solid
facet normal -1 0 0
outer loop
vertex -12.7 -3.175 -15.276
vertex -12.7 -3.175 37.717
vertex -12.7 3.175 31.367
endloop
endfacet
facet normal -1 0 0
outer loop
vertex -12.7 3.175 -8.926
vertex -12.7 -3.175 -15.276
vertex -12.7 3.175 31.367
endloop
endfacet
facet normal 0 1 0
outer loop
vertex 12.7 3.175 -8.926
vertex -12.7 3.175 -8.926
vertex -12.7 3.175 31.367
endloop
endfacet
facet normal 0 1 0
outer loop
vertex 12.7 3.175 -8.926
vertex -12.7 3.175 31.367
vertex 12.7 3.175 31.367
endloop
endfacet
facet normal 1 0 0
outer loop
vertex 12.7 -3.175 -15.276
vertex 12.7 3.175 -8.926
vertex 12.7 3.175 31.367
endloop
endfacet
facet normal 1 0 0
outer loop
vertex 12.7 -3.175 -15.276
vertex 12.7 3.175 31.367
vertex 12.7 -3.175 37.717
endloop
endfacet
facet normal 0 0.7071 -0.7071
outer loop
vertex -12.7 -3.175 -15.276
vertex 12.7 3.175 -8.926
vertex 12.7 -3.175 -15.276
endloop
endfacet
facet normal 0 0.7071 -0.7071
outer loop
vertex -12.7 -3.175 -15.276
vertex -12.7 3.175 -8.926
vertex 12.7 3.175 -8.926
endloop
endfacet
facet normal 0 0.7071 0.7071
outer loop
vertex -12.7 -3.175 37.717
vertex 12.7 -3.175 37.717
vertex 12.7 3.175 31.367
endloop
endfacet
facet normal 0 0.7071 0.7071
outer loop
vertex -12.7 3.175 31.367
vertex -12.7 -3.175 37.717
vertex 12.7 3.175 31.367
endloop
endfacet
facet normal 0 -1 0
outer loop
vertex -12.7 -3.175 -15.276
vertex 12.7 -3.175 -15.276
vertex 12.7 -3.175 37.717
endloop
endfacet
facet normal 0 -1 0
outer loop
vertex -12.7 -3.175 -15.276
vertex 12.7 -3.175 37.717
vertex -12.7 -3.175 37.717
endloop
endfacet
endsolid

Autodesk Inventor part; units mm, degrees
ref_plane "Start plane" through (0, 0, -15.2763) normal (0, 0, 1) x (1, 0, 0)
ref_plane "End plane" through (0, 0, 37.7171) normal (0, 0, 1) x (1, 0, 0)
sketch "Sketch" plane through (0, 0, 0) normal (0, 0, 1) x (1, 0, 0)
  line L0 (12.7, -3.175) -> (-12.7, -3.175)
  line L1 (-12.7, -3.175) -> (-12.7, 3.175)
  line L2 (-12.7, 3.175) -> (12.7, 3.175)
  line L3 (12.7, 3.175) -> (12.7, -3.175)
  line L4 (-6, 0) -> (8, 0) construction
  line L5 (0, -30) -> (0, 40) construction
  line L6 (0, 54) -> (0, -44) construction
  line L7 (-17.78, 0) -> (17.78, 0) construction
  dimension "d0" = 6.35
  dimension "d1" = 25.4
  dimension "d4" = 12.7
  dimension "d5" = 3.175
extrude "Body" add sketch "Sketch" along normal up to surface (52.9934 mm away) from surface at -15.2763
sketch "Sketch3" plane through (0, 0, 0) normal (0, 0, 1) x (1, 0, 0)
  line L0 (0, 0) -> (10, 0)
ref_plane "Work Plane3" through (0, 0, 0) normal (0, -1, 0) x (1, 0, 0)
sketch "Sketch4" plane through (0, 0, 0) normal (0, -1, 0) x (1, 0, 0)
  line L0 (-2, -15.2763) -> (12, -15.2763)
  line L1 (-2, 37.7171) -> (12, 37.7171)
  dimension "d9" = 52.9934
ref_plane "Work Plane4" through (0, 1.3151, 33.2269) normal (0, 0.7071, 0.7071) x (1, 0, 0)
split "Split1" plane through (0, 1.3151, 33.2269) removes the side toward (0, 0.7071, 0.7071)
ref_plane "Work Plane5" through (0, -97.9118, -110.0131) normal (0, 0.7071, -0.7071) x (1, 0, 0)
split "Split2" plane through (0, -97.9118, -110.0131) removes the side toward (0, 0.7071, -0.7071)
equation "\"d0\" = G_W"
equation "\"d1\" = G_H"
equation "\"d4\" = 0.5 * d1"
equation "\"d5\" = 0.5 * d0"
equation "\"d2\" = G_L"
equation "\"G_W\" = 6.35"
equation "\"G_H\" = 25.4"
equation "\"G_L\" = d9"
equation "\"G_OFFSET_START\" = 15.27633"
equation "\"G_OFFSET_END\" = 8.98026"
equation "\"d6\" = -G_OFFSET_START"
equation "\"d7\" = G_OFFSET_END + B_L"
equation "\"B_L\" = 28.73682"
properties part number "AISC - 1/4x1 - 2.086" material "Steel, Mild"
